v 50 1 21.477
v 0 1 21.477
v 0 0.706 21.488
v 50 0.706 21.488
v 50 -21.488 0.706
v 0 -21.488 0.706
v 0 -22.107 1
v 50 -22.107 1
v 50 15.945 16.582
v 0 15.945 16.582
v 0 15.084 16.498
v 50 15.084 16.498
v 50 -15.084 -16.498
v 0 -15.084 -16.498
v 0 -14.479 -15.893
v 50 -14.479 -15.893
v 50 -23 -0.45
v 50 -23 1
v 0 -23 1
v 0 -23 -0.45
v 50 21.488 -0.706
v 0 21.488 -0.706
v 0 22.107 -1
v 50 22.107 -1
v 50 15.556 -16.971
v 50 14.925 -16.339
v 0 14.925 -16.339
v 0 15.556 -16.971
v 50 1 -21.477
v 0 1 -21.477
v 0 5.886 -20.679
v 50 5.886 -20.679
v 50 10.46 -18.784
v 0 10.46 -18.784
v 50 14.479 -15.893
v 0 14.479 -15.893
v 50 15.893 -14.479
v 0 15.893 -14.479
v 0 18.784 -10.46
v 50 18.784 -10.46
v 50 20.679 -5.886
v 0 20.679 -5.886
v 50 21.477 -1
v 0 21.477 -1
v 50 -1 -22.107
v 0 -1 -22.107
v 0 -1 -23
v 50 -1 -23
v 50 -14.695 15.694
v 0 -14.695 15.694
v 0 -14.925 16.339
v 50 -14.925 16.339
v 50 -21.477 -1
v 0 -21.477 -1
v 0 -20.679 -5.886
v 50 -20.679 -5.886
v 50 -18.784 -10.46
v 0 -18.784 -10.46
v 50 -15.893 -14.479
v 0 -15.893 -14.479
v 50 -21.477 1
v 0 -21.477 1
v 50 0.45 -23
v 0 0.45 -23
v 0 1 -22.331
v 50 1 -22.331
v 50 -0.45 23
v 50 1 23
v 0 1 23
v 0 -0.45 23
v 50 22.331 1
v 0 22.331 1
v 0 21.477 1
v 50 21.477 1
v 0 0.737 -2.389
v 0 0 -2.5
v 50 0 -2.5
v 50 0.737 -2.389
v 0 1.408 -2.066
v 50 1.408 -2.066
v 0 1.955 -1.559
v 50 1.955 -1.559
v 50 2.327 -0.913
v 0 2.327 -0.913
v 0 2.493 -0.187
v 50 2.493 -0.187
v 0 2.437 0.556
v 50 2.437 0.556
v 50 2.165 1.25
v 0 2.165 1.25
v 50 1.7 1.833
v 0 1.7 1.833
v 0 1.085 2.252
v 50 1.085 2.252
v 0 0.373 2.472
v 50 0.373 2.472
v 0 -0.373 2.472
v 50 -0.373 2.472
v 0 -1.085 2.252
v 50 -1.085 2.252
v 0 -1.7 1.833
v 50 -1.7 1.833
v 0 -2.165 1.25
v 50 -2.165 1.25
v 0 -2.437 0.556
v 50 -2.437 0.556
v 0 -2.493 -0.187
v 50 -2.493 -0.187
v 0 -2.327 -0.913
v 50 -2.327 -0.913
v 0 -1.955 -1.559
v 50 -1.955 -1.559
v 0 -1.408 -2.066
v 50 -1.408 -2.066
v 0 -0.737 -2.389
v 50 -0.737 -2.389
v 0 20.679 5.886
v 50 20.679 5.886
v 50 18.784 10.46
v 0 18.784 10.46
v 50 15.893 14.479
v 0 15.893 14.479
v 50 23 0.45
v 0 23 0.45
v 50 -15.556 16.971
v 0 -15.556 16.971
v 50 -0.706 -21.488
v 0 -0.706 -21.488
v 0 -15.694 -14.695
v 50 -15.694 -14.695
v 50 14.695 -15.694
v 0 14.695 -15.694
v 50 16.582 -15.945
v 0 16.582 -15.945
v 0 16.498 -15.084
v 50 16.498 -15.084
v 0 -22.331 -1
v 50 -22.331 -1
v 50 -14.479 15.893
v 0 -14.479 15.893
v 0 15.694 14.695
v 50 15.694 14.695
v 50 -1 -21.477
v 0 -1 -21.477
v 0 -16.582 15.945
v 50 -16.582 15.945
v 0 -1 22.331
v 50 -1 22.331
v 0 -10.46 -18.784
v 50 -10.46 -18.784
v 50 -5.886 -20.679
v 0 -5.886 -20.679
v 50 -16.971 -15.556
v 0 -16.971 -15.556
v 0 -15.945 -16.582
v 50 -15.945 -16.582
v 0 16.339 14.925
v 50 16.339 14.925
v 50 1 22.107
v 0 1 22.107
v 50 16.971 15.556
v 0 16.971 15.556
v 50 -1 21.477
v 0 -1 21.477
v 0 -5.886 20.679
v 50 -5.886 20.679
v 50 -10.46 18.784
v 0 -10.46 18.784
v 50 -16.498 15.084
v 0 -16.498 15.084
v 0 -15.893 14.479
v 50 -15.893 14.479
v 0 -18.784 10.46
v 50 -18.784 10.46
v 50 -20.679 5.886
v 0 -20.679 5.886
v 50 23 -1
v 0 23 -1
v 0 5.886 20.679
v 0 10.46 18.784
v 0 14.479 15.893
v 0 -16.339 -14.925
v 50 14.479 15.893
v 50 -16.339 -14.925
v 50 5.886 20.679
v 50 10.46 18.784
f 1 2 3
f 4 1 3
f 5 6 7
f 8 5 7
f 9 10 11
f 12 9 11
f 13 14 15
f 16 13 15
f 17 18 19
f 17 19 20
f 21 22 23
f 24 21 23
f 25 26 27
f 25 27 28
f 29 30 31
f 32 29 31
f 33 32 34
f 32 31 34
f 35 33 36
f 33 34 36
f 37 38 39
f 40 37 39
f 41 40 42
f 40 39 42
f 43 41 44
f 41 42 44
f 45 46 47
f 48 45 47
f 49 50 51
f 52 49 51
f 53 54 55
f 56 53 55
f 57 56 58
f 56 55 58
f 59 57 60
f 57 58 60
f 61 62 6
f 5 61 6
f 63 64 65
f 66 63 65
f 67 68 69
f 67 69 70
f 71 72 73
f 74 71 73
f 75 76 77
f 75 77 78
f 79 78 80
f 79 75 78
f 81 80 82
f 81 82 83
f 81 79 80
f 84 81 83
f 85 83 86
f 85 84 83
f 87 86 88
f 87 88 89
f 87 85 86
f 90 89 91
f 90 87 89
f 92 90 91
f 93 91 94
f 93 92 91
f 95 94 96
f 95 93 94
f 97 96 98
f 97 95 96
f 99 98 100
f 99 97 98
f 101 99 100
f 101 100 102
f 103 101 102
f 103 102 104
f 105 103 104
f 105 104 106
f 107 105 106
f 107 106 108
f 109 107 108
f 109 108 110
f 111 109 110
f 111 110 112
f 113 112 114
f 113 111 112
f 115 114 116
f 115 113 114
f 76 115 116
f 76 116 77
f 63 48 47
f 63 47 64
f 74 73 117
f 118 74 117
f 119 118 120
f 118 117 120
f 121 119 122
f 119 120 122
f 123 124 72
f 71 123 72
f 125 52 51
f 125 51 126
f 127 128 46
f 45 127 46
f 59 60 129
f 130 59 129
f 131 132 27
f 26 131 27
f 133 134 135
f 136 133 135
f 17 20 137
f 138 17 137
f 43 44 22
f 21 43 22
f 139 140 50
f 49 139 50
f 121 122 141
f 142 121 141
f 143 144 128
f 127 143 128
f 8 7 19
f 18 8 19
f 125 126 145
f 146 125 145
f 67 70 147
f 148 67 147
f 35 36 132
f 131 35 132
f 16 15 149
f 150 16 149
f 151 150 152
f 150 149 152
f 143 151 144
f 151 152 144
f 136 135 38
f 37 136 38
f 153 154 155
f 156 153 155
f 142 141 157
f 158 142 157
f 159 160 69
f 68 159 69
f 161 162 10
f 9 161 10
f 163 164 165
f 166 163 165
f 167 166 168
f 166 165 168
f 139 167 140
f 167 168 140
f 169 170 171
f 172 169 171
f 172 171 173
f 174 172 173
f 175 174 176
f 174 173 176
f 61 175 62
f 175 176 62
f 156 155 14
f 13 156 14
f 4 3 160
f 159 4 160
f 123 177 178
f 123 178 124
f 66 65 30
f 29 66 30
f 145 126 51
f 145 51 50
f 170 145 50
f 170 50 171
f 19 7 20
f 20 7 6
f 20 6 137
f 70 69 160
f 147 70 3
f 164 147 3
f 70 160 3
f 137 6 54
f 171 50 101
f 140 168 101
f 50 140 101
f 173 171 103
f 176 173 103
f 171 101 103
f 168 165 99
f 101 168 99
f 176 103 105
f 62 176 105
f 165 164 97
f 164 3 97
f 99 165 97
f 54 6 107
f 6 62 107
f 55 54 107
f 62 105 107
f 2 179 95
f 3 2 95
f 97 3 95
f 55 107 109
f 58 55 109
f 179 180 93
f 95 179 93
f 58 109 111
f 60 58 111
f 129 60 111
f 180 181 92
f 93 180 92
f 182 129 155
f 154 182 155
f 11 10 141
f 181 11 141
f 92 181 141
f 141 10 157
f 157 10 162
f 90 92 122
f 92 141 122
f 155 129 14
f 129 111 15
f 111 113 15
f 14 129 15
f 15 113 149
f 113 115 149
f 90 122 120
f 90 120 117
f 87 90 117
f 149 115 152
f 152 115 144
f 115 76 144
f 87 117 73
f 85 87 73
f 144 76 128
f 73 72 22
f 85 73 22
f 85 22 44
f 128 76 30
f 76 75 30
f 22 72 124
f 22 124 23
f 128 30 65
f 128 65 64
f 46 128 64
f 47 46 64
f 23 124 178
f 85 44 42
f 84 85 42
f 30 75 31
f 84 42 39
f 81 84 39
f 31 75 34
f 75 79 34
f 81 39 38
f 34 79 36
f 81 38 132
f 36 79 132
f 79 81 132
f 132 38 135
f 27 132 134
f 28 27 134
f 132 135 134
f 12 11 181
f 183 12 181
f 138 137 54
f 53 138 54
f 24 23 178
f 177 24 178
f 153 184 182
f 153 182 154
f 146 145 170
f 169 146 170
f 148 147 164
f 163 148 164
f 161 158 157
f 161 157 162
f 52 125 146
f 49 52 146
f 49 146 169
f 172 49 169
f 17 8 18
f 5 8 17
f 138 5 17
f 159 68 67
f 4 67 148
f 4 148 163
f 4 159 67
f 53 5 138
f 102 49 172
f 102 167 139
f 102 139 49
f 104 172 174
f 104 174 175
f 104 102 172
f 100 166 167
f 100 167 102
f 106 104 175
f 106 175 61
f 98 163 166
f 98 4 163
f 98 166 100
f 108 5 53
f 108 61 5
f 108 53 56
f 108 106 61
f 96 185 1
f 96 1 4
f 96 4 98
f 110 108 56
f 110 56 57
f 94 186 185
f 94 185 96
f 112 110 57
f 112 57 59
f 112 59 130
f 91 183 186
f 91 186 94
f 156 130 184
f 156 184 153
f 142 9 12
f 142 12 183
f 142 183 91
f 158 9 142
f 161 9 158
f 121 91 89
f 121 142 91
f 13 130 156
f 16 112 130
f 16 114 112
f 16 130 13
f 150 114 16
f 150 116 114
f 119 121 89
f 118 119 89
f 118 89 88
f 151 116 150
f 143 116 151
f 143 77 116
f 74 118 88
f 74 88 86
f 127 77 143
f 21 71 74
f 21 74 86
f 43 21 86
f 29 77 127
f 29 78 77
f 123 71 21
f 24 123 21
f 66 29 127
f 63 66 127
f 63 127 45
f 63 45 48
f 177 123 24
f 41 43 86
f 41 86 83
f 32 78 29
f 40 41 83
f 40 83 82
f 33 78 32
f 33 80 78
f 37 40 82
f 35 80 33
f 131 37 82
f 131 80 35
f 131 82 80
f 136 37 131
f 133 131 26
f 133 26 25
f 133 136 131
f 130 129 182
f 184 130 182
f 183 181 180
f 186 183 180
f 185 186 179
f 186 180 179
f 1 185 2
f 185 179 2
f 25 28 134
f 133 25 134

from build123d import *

# Parameters (mm, degrees)
SKETCH1_R           = 2.5
BOSS_EXTRUDE1_DEPTH = 50


with BuildPart() as part:
    # Sketch1 → Boss-Extrude1 (new body)
    # profile 1 of 9: a face of its own
    with BuildSketch(Plane(origin=(0, 0, 0), x_dir=(0, 0, -1), z_dir=(1, 0, 0))):
        with BuildLine():
            Line((-1, 20), (-1, 21.476731595))
            ThreePointArc((-1, 21.476731595), (-8.227693796, 19.863409949), (-14.479235767, 15.89344933))
            Line((-14.479235767, 15.89344933), (-13.435028843, 14.849242405))
            Line((-13.435028843, 14.849242405), (-14.849242405, 13.435028843))
            Line((-14.849242405, 13.435028843), (-15.89344933, 14.479235767))
            ThreePointArc((-15.89344933, 14.479235767), (-19.863409949, 8.227693796), (-21.476731595, 1))
            Line((-21.476731595, 1), (-20, 1))
            Line((-20, 1), (-20, -1))
            Line((-20, -1), (-21.476731595, -1))
            ThreePointArc((-21.476731595, -1), (-19.863409949, -8.227693796), (-15.89344933, -14.479235767))
            Line((-15.89344933, -14.479235767), (-14.849242405, -13.435028843))
            Line((-14.849242405, -13.435028843), (-13.435028843, -14.849242405))
            Line((-13.435028843, -14.849242405), (-14.479235767, -15.89344933))
            ThreePointArc((-14.479235767, -15.89344933), (-8.227693796, -19.863409949), (-1, -21.476731595))
            Line((-1, -21.476731595), (-1, -20))
            Line((-1, -20), (1, -20))
            Line((1, -20), (1, -21.476731595))
            ThreePointArc((1, -21.476731595), (8.227693796, -19.863409949), (14.479235767, -15.89344933))
            Line((14.479235767, -15.89344933), (13.435028843, -14.849242405))
            Line((13.435028843, -14.849242405), (14.849242405, -13.435028843))
            Line((14.849242405, -13.435028843), (15.89344933, -14.479235767))
            ThreePointArc((15.89344933, -14.479235767), (19.863409949, -8.227693796), (21.476731595, -1))
            Line((21.476731595, -1), (20, -1))
            Line((20, -1), (20, 1))
            Line((20, 1), (21.476731595, 1))
            ThreePointArc((21.476731595, 1), (19.863409949, 8.227693796), (15.89344933, 14.479235767))
            Line((15.89344933, 14.479235767), (14.849242405, 13.435028843))
            Line((14.849242405, 13.435028843), (13.435028843, 14.849242405))
            Line((13.435028843, 14.849242405), (14.479235767, 15.89344933))
            ThreePointArc((14.479235767, 15.89344933), (8.227693796, 19.863409949), (1, 21.476731595))
            Line((1, 21.476731595), (1, 20))
            Line((1, 20), (-1, 20))
        make_face()
        Circle(SKETCH1_R, mode=Mode.SUBTRACT)
    # profile 2 of 9: a face of its own
    with BuildSketch(Plane(origin=(0, 0, 0), x_dir=(0, 0, -1), z_dir=(1, 0, 0))):
        Polygon((-1, 22.331430068), (-1, 20), (1, 20), (1, 21.476731595), (0.706241247, 21.488397411), (1, 22.107441235), (1, 23), (-0.450054938, 23), align=None)
    # profile 3 of 9: a face of its own
    with BuildSketch(Plane(origin=(0, 0, 0), x_dir=(0, 0, -1), z_dir=(1, 0, 0))):
        Polygon((-14.695203551, 15.693979501), (-14.925214831, 16.339428393), (-15.556349186, 16.970562748), (-16.581692866, 15.945219069), (-16.497812416, 15.083598853), (-14.849242405, 13.435028843), (-13.435028843, 14.849242405), (-14.479235767, 15.89344933), align=None)
    # profile 4 of 9: a face of its own
    with BuildSketch(Plane(origin=(0, 0, 0), x_dir=(0, 0, -1), z_dir=(1, 0, 0))):
        Polygon((-21.488397411, 0.706241247), (-22.107441235, 1), (-23, 1), (-23, -0.450054938), (-22.331430068, -1), (-20, -1), (-20, 1), (-21.476731595, 1), align=None)
    # profile 5 of 9: a face of its own
    with BuildSketch(Plane(origin=(0, 0, 0), x_dir=(0, 0, -1), z_dir=(1, 0, 0))):
        Polygon((-15.693979501, -14.695203551), (-16.339428393, -14.925214831), (-16.970562748, -15.556349186), (-15.945219069, -16.581692866), (-15.083598853, -16.497812416), (-13.435028843, -14.849242405), (-14.849242405, -13.435028843), (-15.89344933, -14.479235767), align=None)
    # profile 6 of 9: a face of its own
    with BuildSketch(Plane(origin=(0, 0, 0), x_dir=(0, 0, -1), z_dir=(1, 0, 0))):
        Polygon((16.581692866, -15.945219069), (15.556349186, -16.970562748), (14.925214831, -16.339428393), (14.695203551, -15.693979501), (14.479235767, -15.89344933), (13.435028843, -14.849242405), (14.849242405, -13.435028843), (16.497812416, -15.083598853), align=None)
    # profile 7 of 9: a face of its own
    with BuildSketch(Plane(origin=(0, 0, 0), x_dir=(0, 0, -1), z_dir=(1, 0, 0))):
        Polygon((23, 0.450054938), (23, -1), (22.107441235, -1), (21.488397411, -0.706241247), (21.476731595, -1), (20, -1), (20, 1), (22.331430068, 1), align=None)
    # profile 8 of 9: a face of its own
    with BuildSketch(Plane(origin=(0, 0, 0), x_dir=(0, 0, -1), z_dir=(1, 0, 0))):
        Polygon((13.435028843, 14.849242405), (14.849242405, 13.435028843), (15.89344933, 14.479235767), (15.693979501, 14.695203551), (16.339428393, 14.925214831), (16.970562748, 15.556349186), (15.945219069, 16.581692866), (15.083598853, 16.497812416), align=None)
    # profile 9 of 9: a face of its own
    with BuildSketch(Plane(origin=(0, 0, 0), x_dir=(0, 0, -1), z_dir=(1, 0, 0))):
        Polygon((1, -20), (-1, -20), (-1, -21.476731595), (-0.706241247, -21.488397411), (-1, -22.107441235), (-1, -23), (0.450054938, -23), (1, -22.331430068), align=None)
    extrude(amount=BOSS_EXTRUDE1_DEPTH)


solid = part.part
